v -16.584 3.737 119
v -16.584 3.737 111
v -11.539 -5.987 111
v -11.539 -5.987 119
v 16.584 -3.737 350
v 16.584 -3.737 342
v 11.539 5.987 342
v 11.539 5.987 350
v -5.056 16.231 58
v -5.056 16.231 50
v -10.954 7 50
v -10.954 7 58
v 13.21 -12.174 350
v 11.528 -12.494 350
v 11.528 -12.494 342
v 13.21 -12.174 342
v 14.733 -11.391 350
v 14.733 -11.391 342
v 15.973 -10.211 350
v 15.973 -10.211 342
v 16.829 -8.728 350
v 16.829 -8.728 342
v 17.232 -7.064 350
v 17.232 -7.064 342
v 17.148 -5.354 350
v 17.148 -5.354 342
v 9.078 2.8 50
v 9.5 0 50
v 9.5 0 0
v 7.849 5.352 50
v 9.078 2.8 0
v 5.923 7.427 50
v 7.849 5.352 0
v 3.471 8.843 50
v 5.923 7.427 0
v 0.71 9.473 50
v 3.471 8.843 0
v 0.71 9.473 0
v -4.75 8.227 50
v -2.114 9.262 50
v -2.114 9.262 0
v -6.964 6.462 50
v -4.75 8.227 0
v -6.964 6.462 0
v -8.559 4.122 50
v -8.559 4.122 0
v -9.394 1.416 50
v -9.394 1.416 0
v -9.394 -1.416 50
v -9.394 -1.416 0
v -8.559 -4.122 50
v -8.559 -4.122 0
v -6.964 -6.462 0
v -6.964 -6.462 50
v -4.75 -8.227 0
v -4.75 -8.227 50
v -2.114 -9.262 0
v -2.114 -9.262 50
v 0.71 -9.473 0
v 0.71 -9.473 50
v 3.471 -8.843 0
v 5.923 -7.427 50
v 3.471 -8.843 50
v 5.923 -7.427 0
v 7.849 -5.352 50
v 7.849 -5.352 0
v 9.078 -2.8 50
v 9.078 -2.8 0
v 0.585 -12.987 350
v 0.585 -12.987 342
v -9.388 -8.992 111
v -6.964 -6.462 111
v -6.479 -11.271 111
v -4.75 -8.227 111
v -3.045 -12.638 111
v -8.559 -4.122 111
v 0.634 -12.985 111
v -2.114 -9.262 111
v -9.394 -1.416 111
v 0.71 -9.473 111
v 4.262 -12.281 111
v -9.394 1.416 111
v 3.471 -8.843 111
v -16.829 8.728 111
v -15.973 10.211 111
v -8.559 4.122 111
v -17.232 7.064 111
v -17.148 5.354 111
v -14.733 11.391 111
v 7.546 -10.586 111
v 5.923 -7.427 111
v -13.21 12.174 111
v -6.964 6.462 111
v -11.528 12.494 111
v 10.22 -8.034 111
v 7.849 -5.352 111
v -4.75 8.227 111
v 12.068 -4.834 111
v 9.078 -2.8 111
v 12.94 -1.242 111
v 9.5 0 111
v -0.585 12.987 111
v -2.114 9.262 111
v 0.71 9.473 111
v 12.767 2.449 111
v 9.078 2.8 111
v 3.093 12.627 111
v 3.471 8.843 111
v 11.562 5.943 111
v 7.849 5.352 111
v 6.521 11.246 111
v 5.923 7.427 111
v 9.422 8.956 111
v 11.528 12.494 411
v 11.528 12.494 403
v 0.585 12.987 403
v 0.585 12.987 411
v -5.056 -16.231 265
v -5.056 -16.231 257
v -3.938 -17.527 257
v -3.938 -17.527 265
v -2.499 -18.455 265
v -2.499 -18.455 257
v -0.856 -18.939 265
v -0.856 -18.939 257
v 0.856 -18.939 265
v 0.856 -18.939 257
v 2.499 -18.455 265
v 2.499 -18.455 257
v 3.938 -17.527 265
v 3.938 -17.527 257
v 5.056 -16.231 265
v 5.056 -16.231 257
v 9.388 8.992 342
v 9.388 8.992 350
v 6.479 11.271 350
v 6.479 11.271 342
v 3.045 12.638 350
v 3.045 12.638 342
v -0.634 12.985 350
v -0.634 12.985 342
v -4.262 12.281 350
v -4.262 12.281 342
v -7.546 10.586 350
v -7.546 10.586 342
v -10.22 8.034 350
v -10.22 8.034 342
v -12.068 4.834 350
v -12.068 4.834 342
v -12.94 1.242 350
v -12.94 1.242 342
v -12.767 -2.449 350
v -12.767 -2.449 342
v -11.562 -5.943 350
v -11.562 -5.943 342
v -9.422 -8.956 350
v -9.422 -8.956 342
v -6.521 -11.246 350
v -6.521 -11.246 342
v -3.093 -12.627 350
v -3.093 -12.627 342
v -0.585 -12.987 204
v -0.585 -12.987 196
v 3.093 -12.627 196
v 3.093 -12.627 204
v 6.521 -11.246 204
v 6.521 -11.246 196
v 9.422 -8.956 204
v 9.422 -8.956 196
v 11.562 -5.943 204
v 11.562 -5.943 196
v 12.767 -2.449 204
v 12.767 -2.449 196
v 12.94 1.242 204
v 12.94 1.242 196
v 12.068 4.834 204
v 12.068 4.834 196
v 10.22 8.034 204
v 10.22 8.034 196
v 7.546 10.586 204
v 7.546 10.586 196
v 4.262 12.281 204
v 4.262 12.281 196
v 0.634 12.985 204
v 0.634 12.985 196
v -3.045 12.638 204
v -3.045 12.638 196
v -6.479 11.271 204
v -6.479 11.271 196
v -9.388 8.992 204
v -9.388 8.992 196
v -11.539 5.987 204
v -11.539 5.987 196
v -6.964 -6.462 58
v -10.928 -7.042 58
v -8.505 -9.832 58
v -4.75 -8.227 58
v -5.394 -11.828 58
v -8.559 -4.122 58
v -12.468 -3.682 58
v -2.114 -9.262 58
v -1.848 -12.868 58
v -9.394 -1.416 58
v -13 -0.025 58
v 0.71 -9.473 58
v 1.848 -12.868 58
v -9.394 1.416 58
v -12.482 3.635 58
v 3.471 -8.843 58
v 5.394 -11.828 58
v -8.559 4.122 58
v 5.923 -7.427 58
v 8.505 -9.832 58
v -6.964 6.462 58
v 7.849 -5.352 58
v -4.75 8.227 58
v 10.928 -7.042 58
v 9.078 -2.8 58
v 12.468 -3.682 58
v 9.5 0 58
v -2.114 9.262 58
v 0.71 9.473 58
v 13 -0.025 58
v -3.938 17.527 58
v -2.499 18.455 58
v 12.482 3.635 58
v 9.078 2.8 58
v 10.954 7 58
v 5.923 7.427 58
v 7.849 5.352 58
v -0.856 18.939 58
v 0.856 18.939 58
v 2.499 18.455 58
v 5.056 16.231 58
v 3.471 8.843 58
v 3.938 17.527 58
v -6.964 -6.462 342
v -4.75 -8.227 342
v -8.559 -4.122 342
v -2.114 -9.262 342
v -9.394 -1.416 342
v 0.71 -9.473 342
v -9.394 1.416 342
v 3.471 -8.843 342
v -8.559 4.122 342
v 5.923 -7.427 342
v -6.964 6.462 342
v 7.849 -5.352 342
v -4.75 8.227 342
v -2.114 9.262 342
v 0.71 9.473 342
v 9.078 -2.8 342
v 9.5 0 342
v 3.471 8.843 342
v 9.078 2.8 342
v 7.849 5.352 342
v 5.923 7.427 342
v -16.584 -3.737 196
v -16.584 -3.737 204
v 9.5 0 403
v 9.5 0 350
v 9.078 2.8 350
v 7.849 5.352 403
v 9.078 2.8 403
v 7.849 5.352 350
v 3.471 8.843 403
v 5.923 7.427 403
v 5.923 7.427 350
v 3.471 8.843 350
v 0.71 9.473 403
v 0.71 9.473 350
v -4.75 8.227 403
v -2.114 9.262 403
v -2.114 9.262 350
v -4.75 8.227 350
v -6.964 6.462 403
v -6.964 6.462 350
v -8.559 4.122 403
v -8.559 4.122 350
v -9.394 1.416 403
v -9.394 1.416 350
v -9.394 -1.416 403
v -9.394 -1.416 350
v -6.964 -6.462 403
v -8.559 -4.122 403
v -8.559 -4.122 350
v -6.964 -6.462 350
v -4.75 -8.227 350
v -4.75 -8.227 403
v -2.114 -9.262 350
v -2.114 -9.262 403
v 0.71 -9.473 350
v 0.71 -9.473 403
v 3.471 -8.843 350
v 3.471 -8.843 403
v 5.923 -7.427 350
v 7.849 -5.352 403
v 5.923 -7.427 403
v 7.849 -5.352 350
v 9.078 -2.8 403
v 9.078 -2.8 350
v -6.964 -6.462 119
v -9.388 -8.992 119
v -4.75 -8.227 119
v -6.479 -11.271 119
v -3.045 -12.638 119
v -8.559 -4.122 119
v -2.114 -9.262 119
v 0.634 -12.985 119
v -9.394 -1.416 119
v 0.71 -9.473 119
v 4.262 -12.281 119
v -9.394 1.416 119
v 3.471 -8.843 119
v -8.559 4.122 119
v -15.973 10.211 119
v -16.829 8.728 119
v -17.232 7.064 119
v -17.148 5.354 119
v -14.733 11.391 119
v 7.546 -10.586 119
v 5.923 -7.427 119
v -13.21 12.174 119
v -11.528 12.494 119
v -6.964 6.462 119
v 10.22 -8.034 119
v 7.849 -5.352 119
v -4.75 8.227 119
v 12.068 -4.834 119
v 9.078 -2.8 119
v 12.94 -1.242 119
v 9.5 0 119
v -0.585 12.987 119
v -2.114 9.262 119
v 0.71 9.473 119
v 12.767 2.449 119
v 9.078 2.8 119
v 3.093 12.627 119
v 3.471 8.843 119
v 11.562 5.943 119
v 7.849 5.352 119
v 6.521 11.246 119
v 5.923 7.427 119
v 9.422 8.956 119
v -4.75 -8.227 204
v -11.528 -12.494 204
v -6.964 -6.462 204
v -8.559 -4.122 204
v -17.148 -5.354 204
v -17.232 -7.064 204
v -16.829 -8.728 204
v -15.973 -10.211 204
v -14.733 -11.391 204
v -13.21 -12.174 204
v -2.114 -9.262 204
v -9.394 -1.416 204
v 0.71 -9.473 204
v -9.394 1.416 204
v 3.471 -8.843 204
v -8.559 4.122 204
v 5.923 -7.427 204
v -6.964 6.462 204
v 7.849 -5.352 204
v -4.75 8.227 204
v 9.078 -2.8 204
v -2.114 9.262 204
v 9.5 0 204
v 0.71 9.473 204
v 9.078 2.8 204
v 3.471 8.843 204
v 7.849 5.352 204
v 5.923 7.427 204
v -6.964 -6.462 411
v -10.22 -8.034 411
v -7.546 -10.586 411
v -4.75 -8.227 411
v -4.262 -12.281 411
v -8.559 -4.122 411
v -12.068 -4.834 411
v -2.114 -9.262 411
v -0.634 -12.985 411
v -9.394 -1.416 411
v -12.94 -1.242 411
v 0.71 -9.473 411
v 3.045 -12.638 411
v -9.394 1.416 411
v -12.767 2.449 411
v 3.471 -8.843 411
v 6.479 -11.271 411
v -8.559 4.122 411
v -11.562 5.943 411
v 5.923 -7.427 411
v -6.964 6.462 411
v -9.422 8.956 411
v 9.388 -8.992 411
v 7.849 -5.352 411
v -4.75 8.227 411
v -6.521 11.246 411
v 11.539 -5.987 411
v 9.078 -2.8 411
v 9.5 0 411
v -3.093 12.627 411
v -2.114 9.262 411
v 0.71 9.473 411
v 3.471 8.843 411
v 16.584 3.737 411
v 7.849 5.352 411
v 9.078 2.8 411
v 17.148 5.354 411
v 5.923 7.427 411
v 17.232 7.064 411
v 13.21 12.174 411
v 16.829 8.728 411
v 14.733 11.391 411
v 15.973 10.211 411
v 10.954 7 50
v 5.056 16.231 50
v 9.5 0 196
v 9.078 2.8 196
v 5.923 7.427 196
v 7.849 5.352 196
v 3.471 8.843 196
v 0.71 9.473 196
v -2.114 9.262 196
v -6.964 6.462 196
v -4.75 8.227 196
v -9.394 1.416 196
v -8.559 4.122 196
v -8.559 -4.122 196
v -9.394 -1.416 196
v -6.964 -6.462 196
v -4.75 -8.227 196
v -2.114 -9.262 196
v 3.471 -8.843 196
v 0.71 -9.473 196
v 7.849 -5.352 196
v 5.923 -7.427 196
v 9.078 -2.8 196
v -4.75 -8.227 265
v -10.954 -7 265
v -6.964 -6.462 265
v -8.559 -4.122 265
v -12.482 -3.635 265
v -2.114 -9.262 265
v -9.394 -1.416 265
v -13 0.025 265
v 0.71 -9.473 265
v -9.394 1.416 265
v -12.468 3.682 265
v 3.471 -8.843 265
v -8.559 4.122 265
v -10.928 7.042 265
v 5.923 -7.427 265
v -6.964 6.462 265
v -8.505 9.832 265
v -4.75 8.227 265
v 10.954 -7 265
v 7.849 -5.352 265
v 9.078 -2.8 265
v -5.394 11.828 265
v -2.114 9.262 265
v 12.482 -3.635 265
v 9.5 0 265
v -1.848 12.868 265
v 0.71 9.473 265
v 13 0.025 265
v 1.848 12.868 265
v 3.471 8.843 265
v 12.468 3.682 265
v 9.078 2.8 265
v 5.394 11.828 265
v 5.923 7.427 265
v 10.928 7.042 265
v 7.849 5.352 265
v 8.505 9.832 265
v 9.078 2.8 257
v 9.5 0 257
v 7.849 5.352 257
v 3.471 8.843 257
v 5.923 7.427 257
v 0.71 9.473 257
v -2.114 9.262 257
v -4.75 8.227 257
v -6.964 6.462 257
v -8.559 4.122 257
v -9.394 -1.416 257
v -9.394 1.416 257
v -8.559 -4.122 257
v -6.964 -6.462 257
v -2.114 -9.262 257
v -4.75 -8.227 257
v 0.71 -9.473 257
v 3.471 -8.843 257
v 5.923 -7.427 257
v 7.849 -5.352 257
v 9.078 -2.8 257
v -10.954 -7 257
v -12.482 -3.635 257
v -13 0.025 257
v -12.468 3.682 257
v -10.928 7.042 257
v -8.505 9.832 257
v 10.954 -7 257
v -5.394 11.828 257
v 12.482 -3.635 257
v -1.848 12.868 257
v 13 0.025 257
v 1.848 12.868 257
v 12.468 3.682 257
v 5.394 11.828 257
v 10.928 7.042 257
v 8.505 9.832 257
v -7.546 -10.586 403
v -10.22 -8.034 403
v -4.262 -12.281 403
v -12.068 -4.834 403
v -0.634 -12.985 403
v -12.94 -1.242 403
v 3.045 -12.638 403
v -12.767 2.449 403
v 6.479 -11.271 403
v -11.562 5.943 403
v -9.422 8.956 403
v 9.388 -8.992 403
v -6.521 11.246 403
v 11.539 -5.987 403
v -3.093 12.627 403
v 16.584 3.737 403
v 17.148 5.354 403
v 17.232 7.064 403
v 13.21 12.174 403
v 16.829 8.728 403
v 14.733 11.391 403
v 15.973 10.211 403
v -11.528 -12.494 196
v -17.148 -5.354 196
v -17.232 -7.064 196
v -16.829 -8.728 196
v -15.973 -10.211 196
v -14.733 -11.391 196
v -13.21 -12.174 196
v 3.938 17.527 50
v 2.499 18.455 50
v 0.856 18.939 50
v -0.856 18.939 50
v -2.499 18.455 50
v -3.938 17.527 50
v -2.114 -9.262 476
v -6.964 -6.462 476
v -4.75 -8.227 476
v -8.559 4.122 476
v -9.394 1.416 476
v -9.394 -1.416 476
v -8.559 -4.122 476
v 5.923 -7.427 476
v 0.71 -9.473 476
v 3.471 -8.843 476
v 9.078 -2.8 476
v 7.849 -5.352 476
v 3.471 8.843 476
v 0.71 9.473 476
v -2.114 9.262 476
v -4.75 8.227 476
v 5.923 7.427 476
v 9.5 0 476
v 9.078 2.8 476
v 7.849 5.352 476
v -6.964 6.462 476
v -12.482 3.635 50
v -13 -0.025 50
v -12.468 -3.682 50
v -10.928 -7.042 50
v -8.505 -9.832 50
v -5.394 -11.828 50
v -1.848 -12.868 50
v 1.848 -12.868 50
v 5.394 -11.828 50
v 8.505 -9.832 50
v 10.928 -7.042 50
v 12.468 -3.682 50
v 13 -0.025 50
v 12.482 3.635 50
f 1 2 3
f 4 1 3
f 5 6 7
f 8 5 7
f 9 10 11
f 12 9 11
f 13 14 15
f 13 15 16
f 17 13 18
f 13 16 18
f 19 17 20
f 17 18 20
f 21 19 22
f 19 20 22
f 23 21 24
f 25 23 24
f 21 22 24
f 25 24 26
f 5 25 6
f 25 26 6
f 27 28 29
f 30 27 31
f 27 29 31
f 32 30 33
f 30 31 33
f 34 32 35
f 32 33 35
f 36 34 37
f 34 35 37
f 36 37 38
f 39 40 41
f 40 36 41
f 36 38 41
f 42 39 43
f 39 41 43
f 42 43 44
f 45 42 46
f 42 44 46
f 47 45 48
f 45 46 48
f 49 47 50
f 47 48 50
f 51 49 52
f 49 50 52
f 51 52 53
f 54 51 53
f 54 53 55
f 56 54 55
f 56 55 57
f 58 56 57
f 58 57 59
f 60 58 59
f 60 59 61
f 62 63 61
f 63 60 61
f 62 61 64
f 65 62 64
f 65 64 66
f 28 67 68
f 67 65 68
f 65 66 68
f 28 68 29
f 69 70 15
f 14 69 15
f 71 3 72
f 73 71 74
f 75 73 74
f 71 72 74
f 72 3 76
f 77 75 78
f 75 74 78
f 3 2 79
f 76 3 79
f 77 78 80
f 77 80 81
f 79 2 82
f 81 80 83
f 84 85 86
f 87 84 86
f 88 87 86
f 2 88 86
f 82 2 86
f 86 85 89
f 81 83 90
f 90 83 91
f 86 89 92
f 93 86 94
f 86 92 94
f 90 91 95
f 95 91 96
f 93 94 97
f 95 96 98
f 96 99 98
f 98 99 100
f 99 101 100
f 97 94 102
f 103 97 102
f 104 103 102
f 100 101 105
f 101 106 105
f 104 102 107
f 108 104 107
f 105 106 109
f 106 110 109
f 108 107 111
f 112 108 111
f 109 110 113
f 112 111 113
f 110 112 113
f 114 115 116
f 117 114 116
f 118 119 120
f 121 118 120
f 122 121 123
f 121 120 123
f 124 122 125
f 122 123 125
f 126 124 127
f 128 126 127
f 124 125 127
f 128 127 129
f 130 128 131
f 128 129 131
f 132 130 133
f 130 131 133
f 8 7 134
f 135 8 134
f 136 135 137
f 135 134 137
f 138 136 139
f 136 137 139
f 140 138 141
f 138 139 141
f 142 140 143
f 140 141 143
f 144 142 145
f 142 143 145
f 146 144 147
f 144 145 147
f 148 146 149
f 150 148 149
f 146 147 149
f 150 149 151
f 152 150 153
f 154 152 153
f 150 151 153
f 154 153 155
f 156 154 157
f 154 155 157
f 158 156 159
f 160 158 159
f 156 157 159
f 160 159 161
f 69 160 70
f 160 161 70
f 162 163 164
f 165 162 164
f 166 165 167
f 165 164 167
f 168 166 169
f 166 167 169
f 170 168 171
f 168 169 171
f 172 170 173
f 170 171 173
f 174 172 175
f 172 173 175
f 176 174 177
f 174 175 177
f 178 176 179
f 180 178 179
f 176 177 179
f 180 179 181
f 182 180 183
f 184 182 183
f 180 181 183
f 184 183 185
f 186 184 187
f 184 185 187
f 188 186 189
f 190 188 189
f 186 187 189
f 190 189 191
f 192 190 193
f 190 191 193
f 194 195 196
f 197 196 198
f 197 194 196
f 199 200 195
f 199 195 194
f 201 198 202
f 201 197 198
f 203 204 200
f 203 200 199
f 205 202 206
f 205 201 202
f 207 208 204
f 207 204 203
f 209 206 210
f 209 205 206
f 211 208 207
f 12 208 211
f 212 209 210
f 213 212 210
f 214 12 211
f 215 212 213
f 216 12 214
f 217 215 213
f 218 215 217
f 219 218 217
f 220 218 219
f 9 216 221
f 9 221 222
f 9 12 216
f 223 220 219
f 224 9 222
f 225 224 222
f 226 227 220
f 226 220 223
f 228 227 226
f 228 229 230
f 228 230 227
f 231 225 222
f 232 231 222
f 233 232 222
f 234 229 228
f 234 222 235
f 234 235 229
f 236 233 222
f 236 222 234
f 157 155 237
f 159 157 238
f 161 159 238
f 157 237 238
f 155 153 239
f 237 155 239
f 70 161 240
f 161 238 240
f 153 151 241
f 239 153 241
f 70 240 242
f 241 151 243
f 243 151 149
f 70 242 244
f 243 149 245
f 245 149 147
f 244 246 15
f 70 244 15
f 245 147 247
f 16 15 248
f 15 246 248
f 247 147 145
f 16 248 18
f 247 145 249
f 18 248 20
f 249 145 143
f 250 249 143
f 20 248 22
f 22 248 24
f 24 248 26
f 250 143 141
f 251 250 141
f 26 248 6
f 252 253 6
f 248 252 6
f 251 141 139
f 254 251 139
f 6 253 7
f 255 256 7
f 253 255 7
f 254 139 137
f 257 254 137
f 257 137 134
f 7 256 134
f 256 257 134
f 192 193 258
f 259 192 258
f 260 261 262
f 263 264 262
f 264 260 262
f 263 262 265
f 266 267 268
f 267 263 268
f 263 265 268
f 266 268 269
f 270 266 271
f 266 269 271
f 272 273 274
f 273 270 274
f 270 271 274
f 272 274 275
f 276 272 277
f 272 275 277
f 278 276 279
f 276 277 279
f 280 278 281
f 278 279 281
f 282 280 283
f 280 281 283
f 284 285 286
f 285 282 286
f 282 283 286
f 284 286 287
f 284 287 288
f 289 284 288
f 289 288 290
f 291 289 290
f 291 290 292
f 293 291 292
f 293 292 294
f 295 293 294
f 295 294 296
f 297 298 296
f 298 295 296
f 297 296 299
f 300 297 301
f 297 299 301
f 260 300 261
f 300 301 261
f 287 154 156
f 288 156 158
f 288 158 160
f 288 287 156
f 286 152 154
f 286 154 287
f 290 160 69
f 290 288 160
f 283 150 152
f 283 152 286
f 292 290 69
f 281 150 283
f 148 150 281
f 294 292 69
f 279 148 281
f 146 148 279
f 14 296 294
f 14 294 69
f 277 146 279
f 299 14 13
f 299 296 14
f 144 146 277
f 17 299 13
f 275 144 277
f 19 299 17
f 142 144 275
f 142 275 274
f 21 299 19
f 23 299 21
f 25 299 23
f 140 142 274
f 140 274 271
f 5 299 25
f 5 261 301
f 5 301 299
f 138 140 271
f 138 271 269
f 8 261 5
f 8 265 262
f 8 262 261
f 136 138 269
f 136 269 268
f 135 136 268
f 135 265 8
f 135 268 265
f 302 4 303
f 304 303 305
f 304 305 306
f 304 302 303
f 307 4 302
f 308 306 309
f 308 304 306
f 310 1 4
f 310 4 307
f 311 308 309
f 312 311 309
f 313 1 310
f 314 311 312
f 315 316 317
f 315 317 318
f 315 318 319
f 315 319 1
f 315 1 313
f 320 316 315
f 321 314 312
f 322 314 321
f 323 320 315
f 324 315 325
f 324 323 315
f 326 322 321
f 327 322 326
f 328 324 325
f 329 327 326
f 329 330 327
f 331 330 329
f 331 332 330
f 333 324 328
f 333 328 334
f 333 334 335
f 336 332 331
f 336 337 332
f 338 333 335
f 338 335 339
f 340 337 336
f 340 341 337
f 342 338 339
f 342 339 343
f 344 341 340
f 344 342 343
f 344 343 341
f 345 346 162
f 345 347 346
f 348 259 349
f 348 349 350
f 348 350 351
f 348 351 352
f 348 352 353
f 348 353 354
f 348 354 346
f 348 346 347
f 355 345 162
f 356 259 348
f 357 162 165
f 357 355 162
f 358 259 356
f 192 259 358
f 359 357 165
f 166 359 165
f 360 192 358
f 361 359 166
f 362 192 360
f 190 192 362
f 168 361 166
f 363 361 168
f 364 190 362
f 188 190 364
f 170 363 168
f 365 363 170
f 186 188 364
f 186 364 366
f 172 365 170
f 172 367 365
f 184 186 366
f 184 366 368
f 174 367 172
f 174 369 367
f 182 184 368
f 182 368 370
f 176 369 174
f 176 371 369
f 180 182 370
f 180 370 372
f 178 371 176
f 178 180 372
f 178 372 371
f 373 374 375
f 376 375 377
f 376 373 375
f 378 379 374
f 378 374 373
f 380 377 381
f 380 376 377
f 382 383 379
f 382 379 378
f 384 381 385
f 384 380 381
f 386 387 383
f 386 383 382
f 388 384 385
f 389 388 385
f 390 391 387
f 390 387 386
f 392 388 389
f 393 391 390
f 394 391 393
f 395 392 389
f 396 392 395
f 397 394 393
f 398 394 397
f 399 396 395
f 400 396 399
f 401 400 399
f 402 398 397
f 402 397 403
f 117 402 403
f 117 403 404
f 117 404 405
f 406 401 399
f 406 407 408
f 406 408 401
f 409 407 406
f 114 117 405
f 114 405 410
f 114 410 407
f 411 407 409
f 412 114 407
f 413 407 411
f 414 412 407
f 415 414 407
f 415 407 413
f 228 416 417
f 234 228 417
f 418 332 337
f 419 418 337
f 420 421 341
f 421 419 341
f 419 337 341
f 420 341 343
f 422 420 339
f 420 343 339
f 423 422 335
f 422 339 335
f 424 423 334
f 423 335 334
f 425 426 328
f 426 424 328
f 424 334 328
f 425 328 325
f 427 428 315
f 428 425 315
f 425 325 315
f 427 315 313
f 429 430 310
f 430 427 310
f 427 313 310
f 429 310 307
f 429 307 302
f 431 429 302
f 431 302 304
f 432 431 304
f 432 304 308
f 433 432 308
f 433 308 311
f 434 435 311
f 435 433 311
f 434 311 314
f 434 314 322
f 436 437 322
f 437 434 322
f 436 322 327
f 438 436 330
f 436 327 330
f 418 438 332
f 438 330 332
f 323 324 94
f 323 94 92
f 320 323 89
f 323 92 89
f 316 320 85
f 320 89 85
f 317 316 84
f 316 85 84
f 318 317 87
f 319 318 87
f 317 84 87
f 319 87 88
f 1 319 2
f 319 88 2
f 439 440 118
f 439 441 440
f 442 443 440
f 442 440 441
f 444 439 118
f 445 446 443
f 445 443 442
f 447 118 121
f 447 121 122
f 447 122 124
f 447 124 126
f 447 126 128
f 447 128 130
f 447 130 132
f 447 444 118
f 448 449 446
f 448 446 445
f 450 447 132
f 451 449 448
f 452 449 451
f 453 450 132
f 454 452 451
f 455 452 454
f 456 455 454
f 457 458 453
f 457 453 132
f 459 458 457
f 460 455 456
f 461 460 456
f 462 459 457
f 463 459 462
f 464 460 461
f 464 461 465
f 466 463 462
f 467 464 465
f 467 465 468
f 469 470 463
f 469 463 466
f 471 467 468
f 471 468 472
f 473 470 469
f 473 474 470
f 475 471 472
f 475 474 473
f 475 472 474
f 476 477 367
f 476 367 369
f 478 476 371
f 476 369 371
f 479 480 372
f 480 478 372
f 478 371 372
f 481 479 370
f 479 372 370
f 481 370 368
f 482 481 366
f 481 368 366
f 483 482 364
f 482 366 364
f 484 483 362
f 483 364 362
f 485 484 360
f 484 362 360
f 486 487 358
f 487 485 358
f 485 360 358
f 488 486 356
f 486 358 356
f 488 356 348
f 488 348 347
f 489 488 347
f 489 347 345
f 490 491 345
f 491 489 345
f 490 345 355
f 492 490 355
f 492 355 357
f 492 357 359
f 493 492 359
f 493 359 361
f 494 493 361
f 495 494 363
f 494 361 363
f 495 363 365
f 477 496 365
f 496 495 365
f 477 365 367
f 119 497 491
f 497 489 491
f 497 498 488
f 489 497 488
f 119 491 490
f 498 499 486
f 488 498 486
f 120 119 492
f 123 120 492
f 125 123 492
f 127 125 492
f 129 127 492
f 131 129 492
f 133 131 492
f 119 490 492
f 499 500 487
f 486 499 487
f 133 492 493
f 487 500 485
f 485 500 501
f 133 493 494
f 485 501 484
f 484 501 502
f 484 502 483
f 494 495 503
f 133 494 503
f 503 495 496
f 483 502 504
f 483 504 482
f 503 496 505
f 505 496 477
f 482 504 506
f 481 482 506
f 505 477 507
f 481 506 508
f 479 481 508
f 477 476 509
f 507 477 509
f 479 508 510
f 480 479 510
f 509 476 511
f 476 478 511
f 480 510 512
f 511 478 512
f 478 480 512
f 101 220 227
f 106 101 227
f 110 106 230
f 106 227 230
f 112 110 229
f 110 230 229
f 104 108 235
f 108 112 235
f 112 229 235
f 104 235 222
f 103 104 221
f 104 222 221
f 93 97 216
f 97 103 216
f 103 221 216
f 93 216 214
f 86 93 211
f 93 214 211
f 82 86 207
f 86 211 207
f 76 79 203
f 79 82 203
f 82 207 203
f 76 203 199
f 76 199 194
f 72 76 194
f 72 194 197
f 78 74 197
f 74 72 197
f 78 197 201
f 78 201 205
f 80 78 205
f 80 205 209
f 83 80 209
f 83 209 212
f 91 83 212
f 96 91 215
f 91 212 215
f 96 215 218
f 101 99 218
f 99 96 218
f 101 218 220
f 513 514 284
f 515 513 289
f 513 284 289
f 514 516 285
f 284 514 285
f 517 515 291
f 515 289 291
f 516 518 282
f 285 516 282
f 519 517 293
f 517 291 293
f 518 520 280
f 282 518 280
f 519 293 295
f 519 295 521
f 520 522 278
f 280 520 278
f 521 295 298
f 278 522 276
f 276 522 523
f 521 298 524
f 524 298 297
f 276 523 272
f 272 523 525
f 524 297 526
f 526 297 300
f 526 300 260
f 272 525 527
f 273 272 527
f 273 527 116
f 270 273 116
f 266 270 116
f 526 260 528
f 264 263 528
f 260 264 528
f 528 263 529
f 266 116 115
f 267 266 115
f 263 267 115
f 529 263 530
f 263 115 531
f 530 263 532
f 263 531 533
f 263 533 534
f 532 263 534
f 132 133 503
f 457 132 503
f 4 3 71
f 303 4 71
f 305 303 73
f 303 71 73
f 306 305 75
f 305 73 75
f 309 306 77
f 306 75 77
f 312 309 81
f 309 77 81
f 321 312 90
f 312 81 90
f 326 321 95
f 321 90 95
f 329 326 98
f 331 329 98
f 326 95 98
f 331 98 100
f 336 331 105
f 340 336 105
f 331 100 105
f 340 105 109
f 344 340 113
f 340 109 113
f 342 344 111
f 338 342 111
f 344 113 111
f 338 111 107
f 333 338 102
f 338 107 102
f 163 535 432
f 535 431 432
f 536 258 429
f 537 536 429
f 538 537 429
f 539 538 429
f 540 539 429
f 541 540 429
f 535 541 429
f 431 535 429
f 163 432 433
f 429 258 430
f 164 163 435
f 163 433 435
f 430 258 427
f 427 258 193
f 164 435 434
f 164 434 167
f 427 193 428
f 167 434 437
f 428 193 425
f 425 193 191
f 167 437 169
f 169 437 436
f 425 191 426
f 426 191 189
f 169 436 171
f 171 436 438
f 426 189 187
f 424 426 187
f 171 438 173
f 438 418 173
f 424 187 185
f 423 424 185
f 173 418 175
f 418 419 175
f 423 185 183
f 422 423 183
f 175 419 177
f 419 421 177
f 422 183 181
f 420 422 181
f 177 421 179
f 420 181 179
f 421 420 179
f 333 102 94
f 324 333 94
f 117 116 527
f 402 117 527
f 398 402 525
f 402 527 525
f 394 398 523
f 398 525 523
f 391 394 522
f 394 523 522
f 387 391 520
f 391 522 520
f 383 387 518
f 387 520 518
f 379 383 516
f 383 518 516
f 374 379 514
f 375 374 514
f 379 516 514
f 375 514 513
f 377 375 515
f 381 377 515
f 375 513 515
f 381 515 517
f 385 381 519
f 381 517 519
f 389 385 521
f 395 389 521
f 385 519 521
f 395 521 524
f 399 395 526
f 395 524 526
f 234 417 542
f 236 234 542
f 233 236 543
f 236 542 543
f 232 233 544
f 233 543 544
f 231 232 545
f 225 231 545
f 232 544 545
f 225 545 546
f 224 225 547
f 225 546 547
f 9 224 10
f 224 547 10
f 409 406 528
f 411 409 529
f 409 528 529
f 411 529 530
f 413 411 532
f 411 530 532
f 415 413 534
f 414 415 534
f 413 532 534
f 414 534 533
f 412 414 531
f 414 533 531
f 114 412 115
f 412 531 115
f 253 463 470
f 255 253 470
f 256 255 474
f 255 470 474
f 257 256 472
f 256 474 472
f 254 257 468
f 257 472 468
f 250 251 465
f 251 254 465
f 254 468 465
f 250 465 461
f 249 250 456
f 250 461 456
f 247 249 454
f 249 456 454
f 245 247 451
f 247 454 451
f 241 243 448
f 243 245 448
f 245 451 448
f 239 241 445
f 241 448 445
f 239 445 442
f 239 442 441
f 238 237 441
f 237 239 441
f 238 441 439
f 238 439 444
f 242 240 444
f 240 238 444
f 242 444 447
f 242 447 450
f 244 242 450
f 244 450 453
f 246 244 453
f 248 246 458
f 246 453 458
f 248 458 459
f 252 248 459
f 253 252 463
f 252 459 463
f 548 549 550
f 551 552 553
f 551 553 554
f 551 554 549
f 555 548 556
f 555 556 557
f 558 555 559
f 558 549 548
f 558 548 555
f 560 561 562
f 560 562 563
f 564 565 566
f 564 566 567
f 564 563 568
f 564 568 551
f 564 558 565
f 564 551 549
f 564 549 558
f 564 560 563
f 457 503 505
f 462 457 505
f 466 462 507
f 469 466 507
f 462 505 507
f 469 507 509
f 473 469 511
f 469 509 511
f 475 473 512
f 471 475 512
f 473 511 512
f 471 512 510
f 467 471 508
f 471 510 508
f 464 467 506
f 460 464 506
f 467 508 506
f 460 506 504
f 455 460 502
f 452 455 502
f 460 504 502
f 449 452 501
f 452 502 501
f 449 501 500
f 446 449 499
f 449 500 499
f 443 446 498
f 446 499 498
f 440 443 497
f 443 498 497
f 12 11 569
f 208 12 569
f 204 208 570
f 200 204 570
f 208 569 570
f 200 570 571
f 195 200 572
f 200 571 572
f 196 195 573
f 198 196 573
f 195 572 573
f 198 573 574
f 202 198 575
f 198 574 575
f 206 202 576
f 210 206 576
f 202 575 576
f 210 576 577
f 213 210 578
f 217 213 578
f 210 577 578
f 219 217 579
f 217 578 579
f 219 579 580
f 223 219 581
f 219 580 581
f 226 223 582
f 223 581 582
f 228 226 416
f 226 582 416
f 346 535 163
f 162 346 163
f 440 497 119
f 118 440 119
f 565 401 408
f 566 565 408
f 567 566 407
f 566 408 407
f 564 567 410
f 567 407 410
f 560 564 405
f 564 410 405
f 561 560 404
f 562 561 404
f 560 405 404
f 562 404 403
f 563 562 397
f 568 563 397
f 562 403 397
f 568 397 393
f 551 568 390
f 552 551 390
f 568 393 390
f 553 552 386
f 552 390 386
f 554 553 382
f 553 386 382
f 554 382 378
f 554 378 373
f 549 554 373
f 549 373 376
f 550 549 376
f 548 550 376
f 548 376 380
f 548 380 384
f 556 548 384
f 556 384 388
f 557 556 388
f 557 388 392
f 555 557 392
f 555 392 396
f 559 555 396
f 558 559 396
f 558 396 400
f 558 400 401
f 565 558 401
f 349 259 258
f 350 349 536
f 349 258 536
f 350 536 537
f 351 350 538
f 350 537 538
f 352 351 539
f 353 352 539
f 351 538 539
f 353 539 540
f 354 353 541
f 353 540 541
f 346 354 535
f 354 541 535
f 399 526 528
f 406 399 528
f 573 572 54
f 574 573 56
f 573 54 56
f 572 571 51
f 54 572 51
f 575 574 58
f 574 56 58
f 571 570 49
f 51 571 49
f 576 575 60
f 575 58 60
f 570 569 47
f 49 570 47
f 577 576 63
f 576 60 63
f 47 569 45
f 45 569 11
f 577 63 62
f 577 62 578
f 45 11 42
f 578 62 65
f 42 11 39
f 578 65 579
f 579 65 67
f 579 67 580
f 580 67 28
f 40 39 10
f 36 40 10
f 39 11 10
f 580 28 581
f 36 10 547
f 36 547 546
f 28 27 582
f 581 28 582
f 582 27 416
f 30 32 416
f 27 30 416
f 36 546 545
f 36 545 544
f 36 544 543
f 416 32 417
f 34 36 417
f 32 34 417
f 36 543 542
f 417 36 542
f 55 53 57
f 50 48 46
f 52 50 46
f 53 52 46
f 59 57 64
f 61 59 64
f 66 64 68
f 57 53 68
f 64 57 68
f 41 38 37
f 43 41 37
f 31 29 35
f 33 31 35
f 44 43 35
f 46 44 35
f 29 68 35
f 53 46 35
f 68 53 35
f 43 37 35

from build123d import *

# Parameters (mm, degrees)
SKETCH1_R           = 9.5
BOSS_EXTRUDE1_DEPTH = 476
BOSS_EXTRUDE2_DEPTH = 8
BOSS_EXTRUDE3_DEPTH = 8
BOSS_EXTRUDE4_DEPTH = 8
BOSS_EXTRUDE5_DEPTH = 8
BOSS_EXTRUDE6_DEPTH = 8
BOSS_EXTRUDE7_DEPTH = 8


with BuildPart() as part:
    # Sketch1 → Boss-Extrude1 (new body)
    with BuildSketch(Plane.XY):
        Circle(SKETCH1_R)
    extrude(amount=BOSS_EXTRUDE1_DEPTH)

    # Sketch2 → Boss-Extrude2 (add)
    with BuildSketch(Plane(origin=(0, 0, 50), x_dir=(-1, 0, 0), z_dir=(0, 0, -1))):
        with BuildLine():
            Line((-10.954451152, 6.999999997), (-5.055900535, 16.230769231))
            ThreePointArc((-5.055900535, 16.230769231), (-1e-09, 19.000000003), (5.055900534, 16.230769233))
            Line((5.055900534, 16.230769233), (10.954451152, 6.999999997))
            ThreePointArc((10.954451152, 6.999999997), (0, -13), (-10.954451152, 6.999999997))
        make_face()
    extrude(amount=-BOSS_EXTRUDE2_DEPTH)

    # Sketch3 → Boss-Extrude3 (add)
    with BuildSketch(Plane.XY.offset(111)):
        with BuildLine():
            Line((-0.584952247, 12.986832981), (-11.52830821, 12.493922918))
            ThreePointArc((-11.52830821, 12.493922918), (-16.454482674, 9.500000003), (-16.584208745, 3.736846315))
            Line((-16.584208745, 3.736846315), (-11.5394034, -5.986832984))
            ThreePointArc((-11.5394034, -5.986832984), (11.258330249, -6.5), (-0.584952247, 12.986832981))
        make_face()
    extrude(amount=BOSS_EXTRUDE3_DEPTH)

    # Sketch4 → Boss-Extrude4 (add)
    with BuildSketch(Plane.XY.offset(196)):
        with BuildLine():
            Line((-11.5394034, 5.986832984), (-16.584208744, -3.736846313))
            ThreePointArc((-16.584208744, -3.736846313), (-16.454482675, -9.500000001), (-11.528308212, -12.493922917))
            Line((-11.528308212, -12.493922917), (-0.584952247, -12.986832981))
            ThreePointArc((-0.584952247, -12.986832981), (11.258330249, 6.5), (-11.5394034, 5.986832984))
        make_face()
    extrude(amount=BOSS_EXTRUDE4_DEPTH)

    # Sketch5 → Boss-Extrude5 (add)
    with BuildSketch(Plane.XY.offset(257)):
        with BuildLine():
            Line((-10.954451152, -6.999999997), (-5.055900535, -16.230769231))
            ThreePointArc((-5.055900535, -16.230769231), (-1e-09, -19.000000003), (5.055900534, -16.230769233))
            Line((5.055900534, -16.230769233), (10.954451152, -6.999999997))
            ThreePointArc((10.954451152, -6.999999997), (0, 13), (-10.954451152, -6.999999997))
        make_face()
    extrude(amount=BOSS_EXTRUDE5_DEPTH)

    # Sketch6 → Boss-Extrude6 (add)
    with BuildSketch(Plane.XY.offset(342)):
        with BuildLine():
            Line((0.584952247, -12.986832981), (11.52830821, -12.493922918))
            ThreePointArc((11.52830821, -12.493922918), (16.454482674, -9.500000003), (16.584208745, -3.736846315))
            Line((16.584208745, -3.736846315), (11.5394034, 5.986832984))
            ThreePointArc((11.5394034, 5.986832984), (-11.258330249, 6.5), (0.584952247, -12.986832981))
        make_face()
    extrude(amount=BOSS_EXTRUDE6_DEPTH)

    # Sketch7 → Boss-Extrude7 (add)
    with BuildSketch(Plane.XY.offset(403)):
        with BuildLine():
            Line((11.5394034, -5.986832984), (16.584208744, 3.736846313))
            ThreePointArc((16.584208744, 3.736846313), (16.454482675, 9.500000001), (11.528308212, 12.493922917))
            Line((11.528308212, 12.493922917), (0.584952247, 12.986832981))
            ThreePointArc((0.584952247, 12.986832981), (-11.258330249, -6.5), (11.5394034, -5.986832984))
        make_face()
    extrude(amount=BOSS_EXTRUDE7_DEPTH)


solid = part.part
